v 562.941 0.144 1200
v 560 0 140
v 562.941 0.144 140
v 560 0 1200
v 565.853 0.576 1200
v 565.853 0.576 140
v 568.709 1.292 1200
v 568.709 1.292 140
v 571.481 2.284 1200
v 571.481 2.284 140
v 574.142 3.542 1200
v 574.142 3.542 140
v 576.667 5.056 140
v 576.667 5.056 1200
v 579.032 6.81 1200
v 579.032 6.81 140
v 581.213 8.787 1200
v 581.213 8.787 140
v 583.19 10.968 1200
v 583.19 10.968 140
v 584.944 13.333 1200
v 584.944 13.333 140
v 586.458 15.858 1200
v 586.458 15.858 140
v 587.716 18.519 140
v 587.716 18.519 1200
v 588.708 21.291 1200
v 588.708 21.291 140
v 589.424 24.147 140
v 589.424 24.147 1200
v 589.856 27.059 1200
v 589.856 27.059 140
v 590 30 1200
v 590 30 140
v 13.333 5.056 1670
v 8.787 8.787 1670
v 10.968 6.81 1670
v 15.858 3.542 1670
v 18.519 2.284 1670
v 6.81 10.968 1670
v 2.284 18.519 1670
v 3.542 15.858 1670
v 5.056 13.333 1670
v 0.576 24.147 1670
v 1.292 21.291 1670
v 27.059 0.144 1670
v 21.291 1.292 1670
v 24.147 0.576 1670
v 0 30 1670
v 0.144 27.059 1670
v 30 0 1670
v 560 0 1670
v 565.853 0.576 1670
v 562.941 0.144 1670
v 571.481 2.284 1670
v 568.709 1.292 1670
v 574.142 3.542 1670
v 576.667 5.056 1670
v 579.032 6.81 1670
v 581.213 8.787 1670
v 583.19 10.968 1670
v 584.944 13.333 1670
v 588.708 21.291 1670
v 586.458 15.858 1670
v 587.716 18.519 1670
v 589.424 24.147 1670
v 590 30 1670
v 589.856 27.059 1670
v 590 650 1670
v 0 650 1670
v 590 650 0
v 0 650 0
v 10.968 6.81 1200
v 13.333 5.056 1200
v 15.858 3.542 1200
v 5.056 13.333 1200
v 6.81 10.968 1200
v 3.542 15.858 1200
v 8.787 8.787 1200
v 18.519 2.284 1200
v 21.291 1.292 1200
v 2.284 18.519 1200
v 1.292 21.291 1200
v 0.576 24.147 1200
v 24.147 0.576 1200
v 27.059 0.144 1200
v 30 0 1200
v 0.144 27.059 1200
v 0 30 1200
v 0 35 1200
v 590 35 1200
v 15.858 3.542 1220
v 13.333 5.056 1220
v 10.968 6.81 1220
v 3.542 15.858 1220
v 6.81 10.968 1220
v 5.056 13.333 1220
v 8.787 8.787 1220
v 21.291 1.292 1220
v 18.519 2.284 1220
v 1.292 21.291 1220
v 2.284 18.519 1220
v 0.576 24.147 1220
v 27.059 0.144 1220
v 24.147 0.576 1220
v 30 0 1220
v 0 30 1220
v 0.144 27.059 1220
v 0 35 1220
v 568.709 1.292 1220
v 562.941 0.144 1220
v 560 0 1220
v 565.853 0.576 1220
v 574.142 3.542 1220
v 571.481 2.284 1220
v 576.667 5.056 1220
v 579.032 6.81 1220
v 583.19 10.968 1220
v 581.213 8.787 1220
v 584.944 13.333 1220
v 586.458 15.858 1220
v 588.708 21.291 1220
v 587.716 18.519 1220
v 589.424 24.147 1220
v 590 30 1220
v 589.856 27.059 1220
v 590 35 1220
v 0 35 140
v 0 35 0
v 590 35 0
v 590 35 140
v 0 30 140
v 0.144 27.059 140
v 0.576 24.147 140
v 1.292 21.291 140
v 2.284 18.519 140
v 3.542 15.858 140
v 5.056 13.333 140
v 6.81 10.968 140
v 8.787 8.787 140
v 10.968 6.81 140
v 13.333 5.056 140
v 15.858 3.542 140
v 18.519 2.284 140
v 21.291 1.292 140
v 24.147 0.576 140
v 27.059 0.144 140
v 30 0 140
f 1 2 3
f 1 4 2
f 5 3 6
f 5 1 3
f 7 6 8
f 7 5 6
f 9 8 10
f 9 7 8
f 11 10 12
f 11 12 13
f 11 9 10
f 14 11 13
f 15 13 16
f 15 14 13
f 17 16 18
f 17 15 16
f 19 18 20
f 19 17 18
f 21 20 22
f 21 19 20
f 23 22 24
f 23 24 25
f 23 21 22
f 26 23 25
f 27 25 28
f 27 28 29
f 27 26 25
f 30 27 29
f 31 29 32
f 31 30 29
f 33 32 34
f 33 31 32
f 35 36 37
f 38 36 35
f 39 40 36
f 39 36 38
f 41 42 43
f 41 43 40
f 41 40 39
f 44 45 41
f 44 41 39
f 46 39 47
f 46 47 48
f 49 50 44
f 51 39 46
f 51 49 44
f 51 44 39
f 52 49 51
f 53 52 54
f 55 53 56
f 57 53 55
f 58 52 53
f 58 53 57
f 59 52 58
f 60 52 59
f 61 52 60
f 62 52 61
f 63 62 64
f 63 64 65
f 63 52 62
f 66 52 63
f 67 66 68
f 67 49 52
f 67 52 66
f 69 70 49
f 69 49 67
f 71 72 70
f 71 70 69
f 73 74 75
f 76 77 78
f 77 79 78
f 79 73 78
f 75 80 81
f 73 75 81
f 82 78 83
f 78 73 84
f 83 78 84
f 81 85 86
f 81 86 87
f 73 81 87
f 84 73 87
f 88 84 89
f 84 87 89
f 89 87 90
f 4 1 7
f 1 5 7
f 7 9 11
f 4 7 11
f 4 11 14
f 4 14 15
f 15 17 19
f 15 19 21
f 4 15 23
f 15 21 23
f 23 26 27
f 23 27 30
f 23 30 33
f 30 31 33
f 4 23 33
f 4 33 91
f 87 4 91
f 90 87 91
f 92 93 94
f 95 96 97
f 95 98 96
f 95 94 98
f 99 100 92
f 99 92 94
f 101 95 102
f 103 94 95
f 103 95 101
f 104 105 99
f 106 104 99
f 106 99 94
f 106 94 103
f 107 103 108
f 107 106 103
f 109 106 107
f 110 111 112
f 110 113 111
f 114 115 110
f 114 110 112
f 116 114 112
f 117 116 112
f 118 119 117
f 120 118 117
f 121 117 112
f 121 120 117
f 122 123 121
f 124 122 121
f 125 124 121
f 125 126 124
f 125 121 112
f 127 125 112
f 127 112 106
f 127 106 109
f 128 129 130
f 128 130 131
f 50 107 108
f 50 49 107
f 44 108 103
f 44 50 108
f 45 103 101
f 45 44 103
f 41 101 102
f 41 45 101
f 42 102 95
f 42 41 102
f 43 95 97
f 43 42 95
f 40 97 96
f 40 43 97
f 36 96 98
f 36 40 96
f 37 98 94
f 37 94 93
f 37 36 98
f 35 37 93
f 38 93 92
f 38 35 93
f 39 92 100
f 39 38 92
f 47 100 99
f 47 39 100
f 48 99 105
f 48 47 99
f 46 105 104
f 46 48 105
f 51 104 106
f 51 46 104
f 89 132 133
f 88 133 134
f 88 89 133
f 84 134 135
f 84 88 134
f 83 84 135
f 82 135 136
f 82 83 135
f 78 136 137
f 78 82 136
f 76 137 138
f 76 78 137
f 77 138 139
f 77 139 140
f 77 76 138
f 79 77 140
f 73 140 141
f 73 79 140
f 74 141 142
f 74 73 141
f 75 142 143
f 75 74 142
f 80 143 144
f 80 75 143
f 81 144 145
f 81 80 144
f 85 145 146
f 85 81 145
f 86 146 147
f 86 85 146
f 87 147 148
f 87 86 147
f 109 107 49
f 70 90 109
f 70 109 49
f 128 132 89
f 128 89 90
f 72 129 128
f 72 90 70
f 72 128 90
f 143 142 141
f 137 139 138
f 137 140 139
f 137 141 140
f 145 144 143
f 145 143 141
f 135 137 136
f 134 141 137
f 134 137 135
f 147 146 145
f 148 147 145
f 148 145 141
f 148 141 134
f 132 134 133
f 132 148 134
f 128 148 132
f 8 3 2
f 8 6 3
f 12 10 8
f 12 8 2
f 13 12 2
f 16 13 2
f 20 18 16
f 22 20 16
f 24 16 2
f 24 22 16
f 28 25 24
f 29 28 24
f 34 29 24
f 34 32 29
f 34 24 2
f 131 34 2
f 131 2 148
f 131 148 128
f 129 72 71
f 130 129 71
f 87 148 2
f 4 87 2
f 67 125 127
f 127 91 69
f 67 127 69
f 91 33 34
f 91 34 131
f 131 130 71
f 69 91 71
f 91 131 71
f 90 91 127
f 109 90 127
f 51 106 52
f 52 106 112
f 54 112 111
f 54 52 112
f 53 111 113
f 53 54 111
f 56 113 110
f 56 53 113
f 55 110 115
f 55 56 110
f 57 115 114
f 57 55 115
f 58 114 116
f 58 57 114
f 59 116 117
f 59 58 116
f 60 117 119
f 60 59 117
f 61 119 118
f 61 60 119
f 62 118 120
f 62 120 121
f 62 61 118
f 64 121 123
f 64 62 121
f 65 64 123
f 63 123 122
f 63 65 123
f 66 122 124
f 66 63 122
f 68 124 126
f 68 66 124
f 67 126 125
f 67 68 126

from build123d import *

# Parameters (mm, degrees)
F1_W     = 590
F1_H     = 650
F2_DEPTH = 1670
F3_W     = 35
F3_H     = 140
F3_H_2   = 20
F4_DEPTH = 590.001
F5_R     = 30


with BuildPart() as f2:
    # F1 (on Top) → F2 (new body)
    with BuildSketch(Plane.XY):
        with Locations((295, 325)):
            Rectangle(F1_W, F1_H)
    extrude(amount=F2_DEPTH)

    # F3 (on face) → F4 (cut, through all)
    with BuildSketch(Plane.YZ.offset(590)):
        with Locations((17.5, 70)):
            Rectangle(F3_W, F3_H)
        with Locations((17.5, 1210)):
            Rectangle(F3_W, F3_H_2)
    extrude(amount=-F4_DEPTH, mode=Mode.SUBTRACT)

    # F5
    f5_edges = [f2.edges().sort_by_distance(p)[0] for p in [
        (0, 0, 1445),
        (0, 0, 670),
        (590, 0, 670),
        (590, 0, 1445),
    ]]
    fillet(f5_edges, radius=F5_R)


solid = f2.part
